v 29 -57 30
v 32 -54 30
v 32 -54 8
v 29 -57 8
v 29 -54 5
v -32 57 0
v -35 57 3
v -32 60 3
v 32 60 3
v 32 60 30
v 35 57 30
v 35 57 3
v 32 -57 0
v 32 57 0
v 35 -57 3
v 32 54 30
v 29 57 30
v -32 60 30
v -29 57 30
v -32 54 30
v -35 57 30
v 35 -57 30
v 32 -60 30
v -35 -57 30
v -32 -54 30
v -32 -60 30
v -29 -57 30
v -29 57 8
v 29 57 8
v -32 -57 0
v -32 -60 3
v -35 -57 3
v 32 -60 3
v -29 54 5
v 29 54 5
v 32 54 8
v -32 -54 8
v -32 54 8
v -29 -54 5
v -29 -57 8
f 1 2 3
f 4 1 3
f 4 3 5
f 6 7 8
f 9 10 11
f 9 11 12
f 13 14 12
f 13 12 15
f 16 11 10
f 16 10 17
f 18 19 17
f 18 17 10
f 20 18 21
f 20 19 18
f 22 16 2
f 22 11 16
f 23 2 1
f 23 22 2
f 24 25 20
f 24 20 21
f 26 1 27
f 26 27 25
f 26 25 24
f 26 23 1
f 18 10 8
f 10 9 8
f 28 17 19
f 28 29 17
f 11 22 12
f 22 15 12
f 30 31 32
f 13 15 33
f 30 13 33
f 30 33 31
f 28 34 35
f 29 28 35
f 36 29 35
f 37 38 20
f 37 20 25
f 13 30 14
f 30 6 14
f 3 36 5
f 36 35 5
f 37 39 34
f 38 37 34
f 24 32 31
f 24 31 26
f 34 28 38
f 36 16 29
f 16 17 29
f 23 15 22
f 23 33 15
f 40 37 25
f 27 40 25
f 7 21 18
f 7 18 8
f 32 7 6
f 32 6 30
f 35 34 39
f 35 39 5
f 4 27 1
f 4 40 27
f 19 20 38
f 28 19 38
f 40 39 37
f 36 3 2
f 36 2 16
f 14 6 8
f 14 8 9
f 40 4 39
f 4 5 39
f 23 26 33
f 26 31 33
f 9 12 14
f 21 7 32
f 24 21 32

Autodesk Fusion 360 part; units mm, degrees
sketch "Sketch1" plane through (0, 0, 0) normal (0, 0, 1) x (1, 0, 0)
  line L0 (35, 60) -> (-35, 60)
  line L1 (-35, 60) -> (-35, -60)
  line L2 (-35, -60) -> (35, -60)
  line L3 (35, -60) -> (35, 60)
  line L4 (35, 60) -> (-35, -60) construction
  line L5 (-35, 60) -> (35, -60) construction
  dimension "d1" = 70
  dimension "d2" = 120
extrude "Extrude1" add sketch "Sketch1" along normal blind 5
sketch "Sketch2" plane through (0, 0, 5) normal (0, 0, 1) x (-1, 0, 0)
  line L0 (-35, 60) -> (-35, -60)
  line L1 (-35, -60) -> (35, -60)
  line L2 (35, -60) -> (35, 60)
  line L3 (35, 60) -> (-35, 60)
  line L4 (32, 57) -> (-32, 57)
  line L5 (-32, 57) -> (-32, -57)
  line L6 (-32, -57) -> (32, -57)
  line L7 (32, -57) -> (32, 57)
  dimension "d5" = -3
extrude "Extrude2" add sketch "Sketch2" along normal blind 25
chamfer "Chamfer1" distance 3 angle 45 12 edges at (35, -60, 15) (-35, -60, 15) (35, 60, 15) (-35, 60, 15) (-32, 57, 17.5) (0, 57, 5) (-32, 0, 5) (32, 57, 17.5) (32, 0, 5) (32, -57, 17.5) (0, -57, 5) (-32, -57, 17.5) 1 faces at (-11.6667, -20, 0)
